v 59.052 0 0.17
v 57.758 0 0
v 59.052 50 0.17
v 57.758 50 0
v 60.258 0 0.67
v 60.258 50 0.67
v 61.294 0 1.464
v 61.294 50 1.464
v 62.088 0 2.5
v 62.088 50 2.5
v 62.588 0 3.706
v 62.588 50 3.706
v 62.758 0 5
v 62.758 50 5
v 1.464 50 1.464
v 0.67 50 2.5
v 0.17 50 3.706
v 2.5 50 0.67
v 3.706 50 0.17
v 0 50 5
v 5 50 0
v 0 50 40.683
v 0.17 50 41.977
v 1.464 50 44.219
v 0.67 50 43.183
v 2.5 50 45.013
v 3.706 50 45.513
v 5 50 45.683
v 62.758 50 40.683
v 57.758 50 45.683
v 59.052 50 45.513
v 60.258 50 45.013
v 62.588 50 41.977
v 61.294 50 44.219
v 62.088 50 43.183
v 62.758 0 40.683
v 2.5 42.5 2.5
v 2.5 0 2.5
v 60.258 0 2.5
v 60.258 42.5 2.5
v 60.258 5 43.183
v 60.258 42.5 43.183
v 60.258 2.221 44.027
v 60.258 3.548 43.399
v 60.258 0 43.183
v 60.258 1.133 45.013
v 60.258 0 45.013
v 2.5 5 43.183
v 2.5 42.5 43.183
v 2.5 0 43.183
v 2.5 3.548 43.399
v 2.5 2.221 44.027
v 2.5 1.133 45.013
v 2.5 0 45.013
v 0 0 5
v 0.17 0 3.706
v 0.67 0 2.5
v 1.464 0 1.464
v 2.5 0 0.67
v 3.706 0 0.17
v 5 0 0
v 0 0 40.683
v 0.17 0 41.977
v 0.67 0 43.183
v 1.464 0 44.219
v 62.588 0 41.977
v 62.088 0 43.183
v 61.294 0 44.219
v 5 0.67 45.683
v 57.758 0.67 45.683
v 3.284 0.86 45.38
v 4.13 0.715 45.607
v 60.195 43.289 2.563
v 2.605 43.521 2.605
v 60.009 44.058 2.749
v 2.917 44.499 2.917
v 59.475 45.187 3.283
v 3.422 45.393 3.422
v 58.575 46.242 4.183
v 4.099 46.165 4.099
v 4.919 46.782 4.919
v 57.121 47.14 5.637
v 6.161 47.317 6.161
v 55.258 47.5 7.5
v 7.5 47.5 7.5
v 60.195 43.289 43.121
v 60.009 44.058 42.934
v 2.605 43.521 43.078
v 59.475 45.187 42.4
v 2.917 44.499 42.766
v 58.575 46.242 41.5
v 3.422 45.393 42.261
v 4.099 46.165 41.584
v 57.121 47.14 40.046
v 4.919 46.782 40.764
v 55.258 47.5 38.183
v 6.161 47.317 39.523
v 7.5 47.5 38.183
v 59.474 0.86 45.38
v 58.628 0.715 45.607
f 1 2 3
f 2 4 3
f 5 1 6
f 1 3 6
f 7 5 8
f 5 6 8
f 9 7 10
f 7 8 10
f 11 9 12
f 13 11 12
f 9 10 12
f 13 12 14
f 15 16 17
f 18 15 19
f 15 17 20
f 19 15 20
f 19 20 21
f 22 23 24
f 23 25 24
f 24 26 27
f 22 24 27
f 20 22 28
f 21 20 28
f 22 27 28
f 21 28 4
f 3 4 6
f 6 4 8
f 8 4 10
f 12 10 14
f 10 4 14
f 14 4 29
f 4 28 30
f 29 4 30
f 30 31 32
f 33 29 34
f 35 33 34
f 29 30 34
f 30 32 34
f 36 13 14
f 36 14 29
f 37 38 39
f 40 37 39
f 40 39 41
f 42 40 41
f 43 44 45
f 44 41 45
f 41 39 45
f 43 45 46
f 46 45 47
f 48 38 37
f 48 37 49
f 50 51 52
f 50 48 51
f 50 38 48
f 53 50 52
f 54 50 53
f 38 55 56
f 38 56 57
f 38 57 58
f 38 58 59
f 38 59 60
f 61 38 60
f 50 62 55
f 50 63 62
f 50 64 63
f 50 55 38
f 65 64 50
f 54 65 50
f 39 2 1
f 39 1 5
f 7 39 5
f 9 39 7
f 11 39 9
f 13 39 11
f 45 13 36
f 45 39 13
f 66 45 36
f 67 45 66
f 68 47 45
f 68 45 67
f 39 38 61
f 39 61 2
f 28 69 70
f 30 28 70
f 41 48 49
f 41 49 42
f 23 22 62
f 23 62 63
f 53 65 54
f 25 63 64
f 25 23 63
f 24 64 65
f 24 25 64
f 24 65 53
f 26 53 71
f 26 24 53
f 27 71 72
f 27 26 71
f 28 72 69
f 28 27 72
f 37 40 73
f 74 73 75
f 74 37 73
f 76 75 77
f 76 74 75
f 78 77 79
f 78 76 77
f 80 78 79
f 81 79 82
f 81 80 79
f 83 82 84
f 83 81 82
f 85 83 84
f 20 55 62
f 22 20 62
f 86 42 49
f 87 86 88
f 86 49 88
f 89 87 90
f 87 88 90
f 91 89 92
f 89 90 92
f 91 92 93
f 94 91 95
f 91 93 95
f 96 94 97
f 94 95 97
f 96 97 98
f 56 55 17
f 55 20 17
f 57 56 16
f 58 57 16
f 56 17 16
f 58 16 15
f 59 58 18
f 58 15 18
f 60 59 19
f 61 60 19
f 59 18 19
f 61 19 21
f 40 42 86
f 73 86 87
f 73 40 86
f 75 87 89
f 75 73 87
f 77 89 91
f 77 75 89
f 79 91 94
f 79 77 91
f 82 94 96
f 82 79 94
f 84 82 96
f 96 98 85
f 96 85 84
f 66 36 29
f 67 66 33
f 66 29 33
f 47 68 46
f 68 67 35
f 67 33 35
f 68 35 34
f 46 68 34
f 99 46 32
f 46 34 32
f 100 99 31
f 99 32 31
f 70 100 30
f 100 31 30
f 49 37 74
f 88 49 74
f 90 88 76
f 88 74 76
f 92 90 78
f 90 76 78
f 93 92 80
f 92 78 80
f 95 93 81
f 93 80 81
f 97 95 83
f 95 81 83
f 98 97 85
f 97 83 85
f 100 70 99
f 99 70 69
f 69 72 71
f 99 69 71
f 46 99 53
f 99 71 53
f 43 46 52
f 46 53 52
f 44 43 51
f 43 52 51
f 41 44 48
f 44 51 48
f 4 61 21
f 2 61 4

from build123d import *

# Parameters (mm, degrees)
F0_W        = 62.7580881119
F0_H        = 45.6833392382
F1_DEPTH    = 50
F2_T        = -2.5
F3_R        = 5
F4_T1_DEPTH = 40.6833392382
F4_T3_DEPTH = 57.7580881119
F4_T5_DEPTH = 57.7580881119


# Not quite as in the source:
# - a fillet or chamfer that OpenCascade refuses, or shapes differently, is made with other operations: its cross-section is extruded or revolved along the edge and cut away or added


with BuildPart() as f1:
    # F0 (on Front) → F1 (new body)
    with BuildSketch(Plane.XZ):
        with Locations((31.3790440559, 22.8416696191)):
            Rectangle(F0_W, F0_H)
    extrude(amount=-F1_DEPTH)

    # F2
    f2_openings = [f1.faces().sort_by_distance(p)[0] for p in [
        (31.379044, 0, 22.84167),
    ]]
    offset(amount=F2_T, openings=f2_openings)

    # F3
    f3_edges = [f1.edges().sort_by_distance(p)[0] for p in [
        (0, 25, 45.683339),
        (62.758088, 25, 45.683339),
        (62.758088, 25, 0),
        (0, 25, 0),
    ]]
    fillet(f3_edges, radius=F3_R)

    # F4: fillet of radius 5 on 5 edges, made by hand

    # F4_s2 → F4_t1 (join)
    with BuildSketch(Plane.XY.offset(2.5)):
        with BuildLine():
            ThreePointArc((2.5, 42.5), (3.9644660941, 46.0355339059), (7.5, 47.5))
            Line((7.5, 47.5), (2.5, 47.5))
            Line((2.5, 47.5), (2.5, 42.5))
        make_face()
        with BuildLine():
            ThreePointArc((60.2580881119, 42.5), (58.7936220178, 46.0355339059), (55.2580881119, 47.5))
            Line((55.2580881119, 47.5), (60.2580881119, 47.5))
            Line((60.2580881119, 47.5), (60.2580881119, 42.5))
        make_face()
    extrude(amount=F4_T1_DEPTH)

    # F4_s4 → F4_t3 (join)
    with BuildSketch(Plane.YZ.offset(2.5)):
        with BuildLine():
            ThreePointArc((42.5, 2.5), (46.0355339059, 3.9644660941), (47.5, 7.5))
            Line((47.5, 7.5), (47.5, 2.5))
            Line((47.5, 2.5), (42.5, 2.5))
        make_face()
        with BuildLine():
            ThreePointArc((42.5, 43.1833392382), (46.0355339059, 41.7188731441), (47.5, 38.1833392382))
            Line((47.5, 38.1833392382), (47.5, 43.1833392382))
            Line((47.5, 43.1833392382), (42.5, 43.1833392382))
        make_face()
    extrude(amount=F4_T3_DEPTH)

    # F4_s6 → F4_t5 (cut)
    with BuildSketch(Plane.YZ.offset(2.5)):
        with BuildLine():
            ThreePointArc((0, 48.1833392382), (1.4644660941, 44.6478053322), (5, 43.1833392382))
            Line((5, 43.1833392382), (0, 43.1833392382))
            Line((0, 43.1833392382), (0, 48.1833392382))
        make_face()
    extrude(amount=F4_T5_DEPTH, mode=Mode.SUBTRACT)


solid = f1.part
